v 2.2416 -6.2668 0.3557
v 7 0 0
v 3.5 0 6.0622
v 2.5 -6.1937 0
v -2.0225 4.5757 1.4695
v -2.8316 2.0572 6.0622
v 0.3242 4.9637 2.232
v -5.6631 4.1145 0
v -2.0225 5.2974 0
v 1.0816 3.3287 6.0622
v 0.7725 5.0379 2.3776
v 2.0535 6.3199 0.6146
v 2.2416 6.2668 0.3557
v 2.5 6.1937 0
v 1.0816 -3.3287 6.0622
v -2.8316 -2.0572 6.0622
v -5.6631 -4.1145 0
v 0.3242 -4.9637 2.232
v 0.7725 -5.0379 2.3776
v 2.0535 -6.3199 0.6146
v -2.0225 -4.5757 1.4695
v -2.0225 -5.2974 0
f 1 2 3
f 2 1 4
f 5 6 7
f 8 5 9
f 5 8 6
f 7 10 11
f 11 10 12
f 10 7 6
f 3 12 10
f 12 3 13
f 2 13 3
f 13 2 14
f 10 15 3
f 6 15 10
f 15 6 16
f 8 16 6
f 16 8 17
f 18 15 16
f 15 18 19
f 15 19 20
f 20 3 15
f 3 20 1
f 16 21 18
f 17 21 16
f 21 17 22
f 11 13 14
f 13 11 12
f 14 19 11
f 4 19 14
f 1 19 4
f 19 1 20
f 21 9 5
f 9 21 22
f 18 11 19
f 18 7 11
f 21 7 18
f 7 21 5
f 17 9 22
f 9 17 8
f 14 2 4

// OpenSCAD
// file: M3.scad
module M3(x,y,h){
translate([x,y,0])
	union(){
		translate([0,0,0]) cylinder(h=30,r=1.5,center=true);
		translate([0,0,h/2]) cylinder(h=15,r=3);
		translate([0,0,-h/2]) rotate([180,0,0])cylinder(h=15,r=3);
	}

}
// main file
include <M3.scad>
$fn = 5;

// Make the bolts distribute symmetrically autmatically
module two_screws(x,y)
{
	M3(x,y,22);
	M3(-x,y,22);
}

// Make the bolts distribute symmetrically automatically
module poles(x,y)
{
	translate([x,y,-2]) cylinder(h = 22, r = 4, center = true);
	translate([-x,y,-2]) cylinder(h = 22, r = 4, center = true);

}

// Define the usb rfid reader
module reader(scale)
{
	//difference(){
	union(){
		cube([55,11,23],center=true);
		translate([24.5,0,0])cube([6,30,15],center=true);
		translate([-24.5,0,0])cube([6,30,15],center=true);

		translate([25,0,0])cube([55,7,15],center=true);
	}
   //rotate([0,45,0])translate([32.5,0,0])cube([55,11,23],center=true);
   //}
}

difference(){
	union(){
		difference(){
			minkowski(){
              // Traced probe, extrude
				linear_extrude(height = 18, center = true) import_dxf(file = "drawing.dxf");
				sphere(7);
			}
			translate([0,0,14]) linear_extrude(height = 20) import_dxf(file = "logo.dxf");
			linear_extrude(height = 20, center = true) import_dxf(file = "drawing.dxf");
          // Hole near base for USB cable inlet
			rotate([90,0,0]) cylinder(r=2.5, h=20, center = true);
          // Hole near head for USB cable outlet
			translate([56,120,0]) rotate([0,90,0]) cylinder(r=2.5, h=20, center = true);

			//translate([75,160,0]) cube([25,40,15], center = true);
		
			// Fastener holes
			two_screws(18,1);
			two_screws(33,40);
			two_screws(34,84);
			two_screws(58.5,110);
			two_screws(46,138);
		
			// Make a slot for the rfid reader
			translate([0,147,0]) reader(1);
          // Cut it in half for printing
		  	translate([-80,-50,-50]) cube([320,320,50]);
		}
			// Poles are only on the bottom part
		 //  poles(15,135.5);
		 //  poles(0,70);
		
		}
   two_screws(15,137.5);
   two_screws(0,70);
}
